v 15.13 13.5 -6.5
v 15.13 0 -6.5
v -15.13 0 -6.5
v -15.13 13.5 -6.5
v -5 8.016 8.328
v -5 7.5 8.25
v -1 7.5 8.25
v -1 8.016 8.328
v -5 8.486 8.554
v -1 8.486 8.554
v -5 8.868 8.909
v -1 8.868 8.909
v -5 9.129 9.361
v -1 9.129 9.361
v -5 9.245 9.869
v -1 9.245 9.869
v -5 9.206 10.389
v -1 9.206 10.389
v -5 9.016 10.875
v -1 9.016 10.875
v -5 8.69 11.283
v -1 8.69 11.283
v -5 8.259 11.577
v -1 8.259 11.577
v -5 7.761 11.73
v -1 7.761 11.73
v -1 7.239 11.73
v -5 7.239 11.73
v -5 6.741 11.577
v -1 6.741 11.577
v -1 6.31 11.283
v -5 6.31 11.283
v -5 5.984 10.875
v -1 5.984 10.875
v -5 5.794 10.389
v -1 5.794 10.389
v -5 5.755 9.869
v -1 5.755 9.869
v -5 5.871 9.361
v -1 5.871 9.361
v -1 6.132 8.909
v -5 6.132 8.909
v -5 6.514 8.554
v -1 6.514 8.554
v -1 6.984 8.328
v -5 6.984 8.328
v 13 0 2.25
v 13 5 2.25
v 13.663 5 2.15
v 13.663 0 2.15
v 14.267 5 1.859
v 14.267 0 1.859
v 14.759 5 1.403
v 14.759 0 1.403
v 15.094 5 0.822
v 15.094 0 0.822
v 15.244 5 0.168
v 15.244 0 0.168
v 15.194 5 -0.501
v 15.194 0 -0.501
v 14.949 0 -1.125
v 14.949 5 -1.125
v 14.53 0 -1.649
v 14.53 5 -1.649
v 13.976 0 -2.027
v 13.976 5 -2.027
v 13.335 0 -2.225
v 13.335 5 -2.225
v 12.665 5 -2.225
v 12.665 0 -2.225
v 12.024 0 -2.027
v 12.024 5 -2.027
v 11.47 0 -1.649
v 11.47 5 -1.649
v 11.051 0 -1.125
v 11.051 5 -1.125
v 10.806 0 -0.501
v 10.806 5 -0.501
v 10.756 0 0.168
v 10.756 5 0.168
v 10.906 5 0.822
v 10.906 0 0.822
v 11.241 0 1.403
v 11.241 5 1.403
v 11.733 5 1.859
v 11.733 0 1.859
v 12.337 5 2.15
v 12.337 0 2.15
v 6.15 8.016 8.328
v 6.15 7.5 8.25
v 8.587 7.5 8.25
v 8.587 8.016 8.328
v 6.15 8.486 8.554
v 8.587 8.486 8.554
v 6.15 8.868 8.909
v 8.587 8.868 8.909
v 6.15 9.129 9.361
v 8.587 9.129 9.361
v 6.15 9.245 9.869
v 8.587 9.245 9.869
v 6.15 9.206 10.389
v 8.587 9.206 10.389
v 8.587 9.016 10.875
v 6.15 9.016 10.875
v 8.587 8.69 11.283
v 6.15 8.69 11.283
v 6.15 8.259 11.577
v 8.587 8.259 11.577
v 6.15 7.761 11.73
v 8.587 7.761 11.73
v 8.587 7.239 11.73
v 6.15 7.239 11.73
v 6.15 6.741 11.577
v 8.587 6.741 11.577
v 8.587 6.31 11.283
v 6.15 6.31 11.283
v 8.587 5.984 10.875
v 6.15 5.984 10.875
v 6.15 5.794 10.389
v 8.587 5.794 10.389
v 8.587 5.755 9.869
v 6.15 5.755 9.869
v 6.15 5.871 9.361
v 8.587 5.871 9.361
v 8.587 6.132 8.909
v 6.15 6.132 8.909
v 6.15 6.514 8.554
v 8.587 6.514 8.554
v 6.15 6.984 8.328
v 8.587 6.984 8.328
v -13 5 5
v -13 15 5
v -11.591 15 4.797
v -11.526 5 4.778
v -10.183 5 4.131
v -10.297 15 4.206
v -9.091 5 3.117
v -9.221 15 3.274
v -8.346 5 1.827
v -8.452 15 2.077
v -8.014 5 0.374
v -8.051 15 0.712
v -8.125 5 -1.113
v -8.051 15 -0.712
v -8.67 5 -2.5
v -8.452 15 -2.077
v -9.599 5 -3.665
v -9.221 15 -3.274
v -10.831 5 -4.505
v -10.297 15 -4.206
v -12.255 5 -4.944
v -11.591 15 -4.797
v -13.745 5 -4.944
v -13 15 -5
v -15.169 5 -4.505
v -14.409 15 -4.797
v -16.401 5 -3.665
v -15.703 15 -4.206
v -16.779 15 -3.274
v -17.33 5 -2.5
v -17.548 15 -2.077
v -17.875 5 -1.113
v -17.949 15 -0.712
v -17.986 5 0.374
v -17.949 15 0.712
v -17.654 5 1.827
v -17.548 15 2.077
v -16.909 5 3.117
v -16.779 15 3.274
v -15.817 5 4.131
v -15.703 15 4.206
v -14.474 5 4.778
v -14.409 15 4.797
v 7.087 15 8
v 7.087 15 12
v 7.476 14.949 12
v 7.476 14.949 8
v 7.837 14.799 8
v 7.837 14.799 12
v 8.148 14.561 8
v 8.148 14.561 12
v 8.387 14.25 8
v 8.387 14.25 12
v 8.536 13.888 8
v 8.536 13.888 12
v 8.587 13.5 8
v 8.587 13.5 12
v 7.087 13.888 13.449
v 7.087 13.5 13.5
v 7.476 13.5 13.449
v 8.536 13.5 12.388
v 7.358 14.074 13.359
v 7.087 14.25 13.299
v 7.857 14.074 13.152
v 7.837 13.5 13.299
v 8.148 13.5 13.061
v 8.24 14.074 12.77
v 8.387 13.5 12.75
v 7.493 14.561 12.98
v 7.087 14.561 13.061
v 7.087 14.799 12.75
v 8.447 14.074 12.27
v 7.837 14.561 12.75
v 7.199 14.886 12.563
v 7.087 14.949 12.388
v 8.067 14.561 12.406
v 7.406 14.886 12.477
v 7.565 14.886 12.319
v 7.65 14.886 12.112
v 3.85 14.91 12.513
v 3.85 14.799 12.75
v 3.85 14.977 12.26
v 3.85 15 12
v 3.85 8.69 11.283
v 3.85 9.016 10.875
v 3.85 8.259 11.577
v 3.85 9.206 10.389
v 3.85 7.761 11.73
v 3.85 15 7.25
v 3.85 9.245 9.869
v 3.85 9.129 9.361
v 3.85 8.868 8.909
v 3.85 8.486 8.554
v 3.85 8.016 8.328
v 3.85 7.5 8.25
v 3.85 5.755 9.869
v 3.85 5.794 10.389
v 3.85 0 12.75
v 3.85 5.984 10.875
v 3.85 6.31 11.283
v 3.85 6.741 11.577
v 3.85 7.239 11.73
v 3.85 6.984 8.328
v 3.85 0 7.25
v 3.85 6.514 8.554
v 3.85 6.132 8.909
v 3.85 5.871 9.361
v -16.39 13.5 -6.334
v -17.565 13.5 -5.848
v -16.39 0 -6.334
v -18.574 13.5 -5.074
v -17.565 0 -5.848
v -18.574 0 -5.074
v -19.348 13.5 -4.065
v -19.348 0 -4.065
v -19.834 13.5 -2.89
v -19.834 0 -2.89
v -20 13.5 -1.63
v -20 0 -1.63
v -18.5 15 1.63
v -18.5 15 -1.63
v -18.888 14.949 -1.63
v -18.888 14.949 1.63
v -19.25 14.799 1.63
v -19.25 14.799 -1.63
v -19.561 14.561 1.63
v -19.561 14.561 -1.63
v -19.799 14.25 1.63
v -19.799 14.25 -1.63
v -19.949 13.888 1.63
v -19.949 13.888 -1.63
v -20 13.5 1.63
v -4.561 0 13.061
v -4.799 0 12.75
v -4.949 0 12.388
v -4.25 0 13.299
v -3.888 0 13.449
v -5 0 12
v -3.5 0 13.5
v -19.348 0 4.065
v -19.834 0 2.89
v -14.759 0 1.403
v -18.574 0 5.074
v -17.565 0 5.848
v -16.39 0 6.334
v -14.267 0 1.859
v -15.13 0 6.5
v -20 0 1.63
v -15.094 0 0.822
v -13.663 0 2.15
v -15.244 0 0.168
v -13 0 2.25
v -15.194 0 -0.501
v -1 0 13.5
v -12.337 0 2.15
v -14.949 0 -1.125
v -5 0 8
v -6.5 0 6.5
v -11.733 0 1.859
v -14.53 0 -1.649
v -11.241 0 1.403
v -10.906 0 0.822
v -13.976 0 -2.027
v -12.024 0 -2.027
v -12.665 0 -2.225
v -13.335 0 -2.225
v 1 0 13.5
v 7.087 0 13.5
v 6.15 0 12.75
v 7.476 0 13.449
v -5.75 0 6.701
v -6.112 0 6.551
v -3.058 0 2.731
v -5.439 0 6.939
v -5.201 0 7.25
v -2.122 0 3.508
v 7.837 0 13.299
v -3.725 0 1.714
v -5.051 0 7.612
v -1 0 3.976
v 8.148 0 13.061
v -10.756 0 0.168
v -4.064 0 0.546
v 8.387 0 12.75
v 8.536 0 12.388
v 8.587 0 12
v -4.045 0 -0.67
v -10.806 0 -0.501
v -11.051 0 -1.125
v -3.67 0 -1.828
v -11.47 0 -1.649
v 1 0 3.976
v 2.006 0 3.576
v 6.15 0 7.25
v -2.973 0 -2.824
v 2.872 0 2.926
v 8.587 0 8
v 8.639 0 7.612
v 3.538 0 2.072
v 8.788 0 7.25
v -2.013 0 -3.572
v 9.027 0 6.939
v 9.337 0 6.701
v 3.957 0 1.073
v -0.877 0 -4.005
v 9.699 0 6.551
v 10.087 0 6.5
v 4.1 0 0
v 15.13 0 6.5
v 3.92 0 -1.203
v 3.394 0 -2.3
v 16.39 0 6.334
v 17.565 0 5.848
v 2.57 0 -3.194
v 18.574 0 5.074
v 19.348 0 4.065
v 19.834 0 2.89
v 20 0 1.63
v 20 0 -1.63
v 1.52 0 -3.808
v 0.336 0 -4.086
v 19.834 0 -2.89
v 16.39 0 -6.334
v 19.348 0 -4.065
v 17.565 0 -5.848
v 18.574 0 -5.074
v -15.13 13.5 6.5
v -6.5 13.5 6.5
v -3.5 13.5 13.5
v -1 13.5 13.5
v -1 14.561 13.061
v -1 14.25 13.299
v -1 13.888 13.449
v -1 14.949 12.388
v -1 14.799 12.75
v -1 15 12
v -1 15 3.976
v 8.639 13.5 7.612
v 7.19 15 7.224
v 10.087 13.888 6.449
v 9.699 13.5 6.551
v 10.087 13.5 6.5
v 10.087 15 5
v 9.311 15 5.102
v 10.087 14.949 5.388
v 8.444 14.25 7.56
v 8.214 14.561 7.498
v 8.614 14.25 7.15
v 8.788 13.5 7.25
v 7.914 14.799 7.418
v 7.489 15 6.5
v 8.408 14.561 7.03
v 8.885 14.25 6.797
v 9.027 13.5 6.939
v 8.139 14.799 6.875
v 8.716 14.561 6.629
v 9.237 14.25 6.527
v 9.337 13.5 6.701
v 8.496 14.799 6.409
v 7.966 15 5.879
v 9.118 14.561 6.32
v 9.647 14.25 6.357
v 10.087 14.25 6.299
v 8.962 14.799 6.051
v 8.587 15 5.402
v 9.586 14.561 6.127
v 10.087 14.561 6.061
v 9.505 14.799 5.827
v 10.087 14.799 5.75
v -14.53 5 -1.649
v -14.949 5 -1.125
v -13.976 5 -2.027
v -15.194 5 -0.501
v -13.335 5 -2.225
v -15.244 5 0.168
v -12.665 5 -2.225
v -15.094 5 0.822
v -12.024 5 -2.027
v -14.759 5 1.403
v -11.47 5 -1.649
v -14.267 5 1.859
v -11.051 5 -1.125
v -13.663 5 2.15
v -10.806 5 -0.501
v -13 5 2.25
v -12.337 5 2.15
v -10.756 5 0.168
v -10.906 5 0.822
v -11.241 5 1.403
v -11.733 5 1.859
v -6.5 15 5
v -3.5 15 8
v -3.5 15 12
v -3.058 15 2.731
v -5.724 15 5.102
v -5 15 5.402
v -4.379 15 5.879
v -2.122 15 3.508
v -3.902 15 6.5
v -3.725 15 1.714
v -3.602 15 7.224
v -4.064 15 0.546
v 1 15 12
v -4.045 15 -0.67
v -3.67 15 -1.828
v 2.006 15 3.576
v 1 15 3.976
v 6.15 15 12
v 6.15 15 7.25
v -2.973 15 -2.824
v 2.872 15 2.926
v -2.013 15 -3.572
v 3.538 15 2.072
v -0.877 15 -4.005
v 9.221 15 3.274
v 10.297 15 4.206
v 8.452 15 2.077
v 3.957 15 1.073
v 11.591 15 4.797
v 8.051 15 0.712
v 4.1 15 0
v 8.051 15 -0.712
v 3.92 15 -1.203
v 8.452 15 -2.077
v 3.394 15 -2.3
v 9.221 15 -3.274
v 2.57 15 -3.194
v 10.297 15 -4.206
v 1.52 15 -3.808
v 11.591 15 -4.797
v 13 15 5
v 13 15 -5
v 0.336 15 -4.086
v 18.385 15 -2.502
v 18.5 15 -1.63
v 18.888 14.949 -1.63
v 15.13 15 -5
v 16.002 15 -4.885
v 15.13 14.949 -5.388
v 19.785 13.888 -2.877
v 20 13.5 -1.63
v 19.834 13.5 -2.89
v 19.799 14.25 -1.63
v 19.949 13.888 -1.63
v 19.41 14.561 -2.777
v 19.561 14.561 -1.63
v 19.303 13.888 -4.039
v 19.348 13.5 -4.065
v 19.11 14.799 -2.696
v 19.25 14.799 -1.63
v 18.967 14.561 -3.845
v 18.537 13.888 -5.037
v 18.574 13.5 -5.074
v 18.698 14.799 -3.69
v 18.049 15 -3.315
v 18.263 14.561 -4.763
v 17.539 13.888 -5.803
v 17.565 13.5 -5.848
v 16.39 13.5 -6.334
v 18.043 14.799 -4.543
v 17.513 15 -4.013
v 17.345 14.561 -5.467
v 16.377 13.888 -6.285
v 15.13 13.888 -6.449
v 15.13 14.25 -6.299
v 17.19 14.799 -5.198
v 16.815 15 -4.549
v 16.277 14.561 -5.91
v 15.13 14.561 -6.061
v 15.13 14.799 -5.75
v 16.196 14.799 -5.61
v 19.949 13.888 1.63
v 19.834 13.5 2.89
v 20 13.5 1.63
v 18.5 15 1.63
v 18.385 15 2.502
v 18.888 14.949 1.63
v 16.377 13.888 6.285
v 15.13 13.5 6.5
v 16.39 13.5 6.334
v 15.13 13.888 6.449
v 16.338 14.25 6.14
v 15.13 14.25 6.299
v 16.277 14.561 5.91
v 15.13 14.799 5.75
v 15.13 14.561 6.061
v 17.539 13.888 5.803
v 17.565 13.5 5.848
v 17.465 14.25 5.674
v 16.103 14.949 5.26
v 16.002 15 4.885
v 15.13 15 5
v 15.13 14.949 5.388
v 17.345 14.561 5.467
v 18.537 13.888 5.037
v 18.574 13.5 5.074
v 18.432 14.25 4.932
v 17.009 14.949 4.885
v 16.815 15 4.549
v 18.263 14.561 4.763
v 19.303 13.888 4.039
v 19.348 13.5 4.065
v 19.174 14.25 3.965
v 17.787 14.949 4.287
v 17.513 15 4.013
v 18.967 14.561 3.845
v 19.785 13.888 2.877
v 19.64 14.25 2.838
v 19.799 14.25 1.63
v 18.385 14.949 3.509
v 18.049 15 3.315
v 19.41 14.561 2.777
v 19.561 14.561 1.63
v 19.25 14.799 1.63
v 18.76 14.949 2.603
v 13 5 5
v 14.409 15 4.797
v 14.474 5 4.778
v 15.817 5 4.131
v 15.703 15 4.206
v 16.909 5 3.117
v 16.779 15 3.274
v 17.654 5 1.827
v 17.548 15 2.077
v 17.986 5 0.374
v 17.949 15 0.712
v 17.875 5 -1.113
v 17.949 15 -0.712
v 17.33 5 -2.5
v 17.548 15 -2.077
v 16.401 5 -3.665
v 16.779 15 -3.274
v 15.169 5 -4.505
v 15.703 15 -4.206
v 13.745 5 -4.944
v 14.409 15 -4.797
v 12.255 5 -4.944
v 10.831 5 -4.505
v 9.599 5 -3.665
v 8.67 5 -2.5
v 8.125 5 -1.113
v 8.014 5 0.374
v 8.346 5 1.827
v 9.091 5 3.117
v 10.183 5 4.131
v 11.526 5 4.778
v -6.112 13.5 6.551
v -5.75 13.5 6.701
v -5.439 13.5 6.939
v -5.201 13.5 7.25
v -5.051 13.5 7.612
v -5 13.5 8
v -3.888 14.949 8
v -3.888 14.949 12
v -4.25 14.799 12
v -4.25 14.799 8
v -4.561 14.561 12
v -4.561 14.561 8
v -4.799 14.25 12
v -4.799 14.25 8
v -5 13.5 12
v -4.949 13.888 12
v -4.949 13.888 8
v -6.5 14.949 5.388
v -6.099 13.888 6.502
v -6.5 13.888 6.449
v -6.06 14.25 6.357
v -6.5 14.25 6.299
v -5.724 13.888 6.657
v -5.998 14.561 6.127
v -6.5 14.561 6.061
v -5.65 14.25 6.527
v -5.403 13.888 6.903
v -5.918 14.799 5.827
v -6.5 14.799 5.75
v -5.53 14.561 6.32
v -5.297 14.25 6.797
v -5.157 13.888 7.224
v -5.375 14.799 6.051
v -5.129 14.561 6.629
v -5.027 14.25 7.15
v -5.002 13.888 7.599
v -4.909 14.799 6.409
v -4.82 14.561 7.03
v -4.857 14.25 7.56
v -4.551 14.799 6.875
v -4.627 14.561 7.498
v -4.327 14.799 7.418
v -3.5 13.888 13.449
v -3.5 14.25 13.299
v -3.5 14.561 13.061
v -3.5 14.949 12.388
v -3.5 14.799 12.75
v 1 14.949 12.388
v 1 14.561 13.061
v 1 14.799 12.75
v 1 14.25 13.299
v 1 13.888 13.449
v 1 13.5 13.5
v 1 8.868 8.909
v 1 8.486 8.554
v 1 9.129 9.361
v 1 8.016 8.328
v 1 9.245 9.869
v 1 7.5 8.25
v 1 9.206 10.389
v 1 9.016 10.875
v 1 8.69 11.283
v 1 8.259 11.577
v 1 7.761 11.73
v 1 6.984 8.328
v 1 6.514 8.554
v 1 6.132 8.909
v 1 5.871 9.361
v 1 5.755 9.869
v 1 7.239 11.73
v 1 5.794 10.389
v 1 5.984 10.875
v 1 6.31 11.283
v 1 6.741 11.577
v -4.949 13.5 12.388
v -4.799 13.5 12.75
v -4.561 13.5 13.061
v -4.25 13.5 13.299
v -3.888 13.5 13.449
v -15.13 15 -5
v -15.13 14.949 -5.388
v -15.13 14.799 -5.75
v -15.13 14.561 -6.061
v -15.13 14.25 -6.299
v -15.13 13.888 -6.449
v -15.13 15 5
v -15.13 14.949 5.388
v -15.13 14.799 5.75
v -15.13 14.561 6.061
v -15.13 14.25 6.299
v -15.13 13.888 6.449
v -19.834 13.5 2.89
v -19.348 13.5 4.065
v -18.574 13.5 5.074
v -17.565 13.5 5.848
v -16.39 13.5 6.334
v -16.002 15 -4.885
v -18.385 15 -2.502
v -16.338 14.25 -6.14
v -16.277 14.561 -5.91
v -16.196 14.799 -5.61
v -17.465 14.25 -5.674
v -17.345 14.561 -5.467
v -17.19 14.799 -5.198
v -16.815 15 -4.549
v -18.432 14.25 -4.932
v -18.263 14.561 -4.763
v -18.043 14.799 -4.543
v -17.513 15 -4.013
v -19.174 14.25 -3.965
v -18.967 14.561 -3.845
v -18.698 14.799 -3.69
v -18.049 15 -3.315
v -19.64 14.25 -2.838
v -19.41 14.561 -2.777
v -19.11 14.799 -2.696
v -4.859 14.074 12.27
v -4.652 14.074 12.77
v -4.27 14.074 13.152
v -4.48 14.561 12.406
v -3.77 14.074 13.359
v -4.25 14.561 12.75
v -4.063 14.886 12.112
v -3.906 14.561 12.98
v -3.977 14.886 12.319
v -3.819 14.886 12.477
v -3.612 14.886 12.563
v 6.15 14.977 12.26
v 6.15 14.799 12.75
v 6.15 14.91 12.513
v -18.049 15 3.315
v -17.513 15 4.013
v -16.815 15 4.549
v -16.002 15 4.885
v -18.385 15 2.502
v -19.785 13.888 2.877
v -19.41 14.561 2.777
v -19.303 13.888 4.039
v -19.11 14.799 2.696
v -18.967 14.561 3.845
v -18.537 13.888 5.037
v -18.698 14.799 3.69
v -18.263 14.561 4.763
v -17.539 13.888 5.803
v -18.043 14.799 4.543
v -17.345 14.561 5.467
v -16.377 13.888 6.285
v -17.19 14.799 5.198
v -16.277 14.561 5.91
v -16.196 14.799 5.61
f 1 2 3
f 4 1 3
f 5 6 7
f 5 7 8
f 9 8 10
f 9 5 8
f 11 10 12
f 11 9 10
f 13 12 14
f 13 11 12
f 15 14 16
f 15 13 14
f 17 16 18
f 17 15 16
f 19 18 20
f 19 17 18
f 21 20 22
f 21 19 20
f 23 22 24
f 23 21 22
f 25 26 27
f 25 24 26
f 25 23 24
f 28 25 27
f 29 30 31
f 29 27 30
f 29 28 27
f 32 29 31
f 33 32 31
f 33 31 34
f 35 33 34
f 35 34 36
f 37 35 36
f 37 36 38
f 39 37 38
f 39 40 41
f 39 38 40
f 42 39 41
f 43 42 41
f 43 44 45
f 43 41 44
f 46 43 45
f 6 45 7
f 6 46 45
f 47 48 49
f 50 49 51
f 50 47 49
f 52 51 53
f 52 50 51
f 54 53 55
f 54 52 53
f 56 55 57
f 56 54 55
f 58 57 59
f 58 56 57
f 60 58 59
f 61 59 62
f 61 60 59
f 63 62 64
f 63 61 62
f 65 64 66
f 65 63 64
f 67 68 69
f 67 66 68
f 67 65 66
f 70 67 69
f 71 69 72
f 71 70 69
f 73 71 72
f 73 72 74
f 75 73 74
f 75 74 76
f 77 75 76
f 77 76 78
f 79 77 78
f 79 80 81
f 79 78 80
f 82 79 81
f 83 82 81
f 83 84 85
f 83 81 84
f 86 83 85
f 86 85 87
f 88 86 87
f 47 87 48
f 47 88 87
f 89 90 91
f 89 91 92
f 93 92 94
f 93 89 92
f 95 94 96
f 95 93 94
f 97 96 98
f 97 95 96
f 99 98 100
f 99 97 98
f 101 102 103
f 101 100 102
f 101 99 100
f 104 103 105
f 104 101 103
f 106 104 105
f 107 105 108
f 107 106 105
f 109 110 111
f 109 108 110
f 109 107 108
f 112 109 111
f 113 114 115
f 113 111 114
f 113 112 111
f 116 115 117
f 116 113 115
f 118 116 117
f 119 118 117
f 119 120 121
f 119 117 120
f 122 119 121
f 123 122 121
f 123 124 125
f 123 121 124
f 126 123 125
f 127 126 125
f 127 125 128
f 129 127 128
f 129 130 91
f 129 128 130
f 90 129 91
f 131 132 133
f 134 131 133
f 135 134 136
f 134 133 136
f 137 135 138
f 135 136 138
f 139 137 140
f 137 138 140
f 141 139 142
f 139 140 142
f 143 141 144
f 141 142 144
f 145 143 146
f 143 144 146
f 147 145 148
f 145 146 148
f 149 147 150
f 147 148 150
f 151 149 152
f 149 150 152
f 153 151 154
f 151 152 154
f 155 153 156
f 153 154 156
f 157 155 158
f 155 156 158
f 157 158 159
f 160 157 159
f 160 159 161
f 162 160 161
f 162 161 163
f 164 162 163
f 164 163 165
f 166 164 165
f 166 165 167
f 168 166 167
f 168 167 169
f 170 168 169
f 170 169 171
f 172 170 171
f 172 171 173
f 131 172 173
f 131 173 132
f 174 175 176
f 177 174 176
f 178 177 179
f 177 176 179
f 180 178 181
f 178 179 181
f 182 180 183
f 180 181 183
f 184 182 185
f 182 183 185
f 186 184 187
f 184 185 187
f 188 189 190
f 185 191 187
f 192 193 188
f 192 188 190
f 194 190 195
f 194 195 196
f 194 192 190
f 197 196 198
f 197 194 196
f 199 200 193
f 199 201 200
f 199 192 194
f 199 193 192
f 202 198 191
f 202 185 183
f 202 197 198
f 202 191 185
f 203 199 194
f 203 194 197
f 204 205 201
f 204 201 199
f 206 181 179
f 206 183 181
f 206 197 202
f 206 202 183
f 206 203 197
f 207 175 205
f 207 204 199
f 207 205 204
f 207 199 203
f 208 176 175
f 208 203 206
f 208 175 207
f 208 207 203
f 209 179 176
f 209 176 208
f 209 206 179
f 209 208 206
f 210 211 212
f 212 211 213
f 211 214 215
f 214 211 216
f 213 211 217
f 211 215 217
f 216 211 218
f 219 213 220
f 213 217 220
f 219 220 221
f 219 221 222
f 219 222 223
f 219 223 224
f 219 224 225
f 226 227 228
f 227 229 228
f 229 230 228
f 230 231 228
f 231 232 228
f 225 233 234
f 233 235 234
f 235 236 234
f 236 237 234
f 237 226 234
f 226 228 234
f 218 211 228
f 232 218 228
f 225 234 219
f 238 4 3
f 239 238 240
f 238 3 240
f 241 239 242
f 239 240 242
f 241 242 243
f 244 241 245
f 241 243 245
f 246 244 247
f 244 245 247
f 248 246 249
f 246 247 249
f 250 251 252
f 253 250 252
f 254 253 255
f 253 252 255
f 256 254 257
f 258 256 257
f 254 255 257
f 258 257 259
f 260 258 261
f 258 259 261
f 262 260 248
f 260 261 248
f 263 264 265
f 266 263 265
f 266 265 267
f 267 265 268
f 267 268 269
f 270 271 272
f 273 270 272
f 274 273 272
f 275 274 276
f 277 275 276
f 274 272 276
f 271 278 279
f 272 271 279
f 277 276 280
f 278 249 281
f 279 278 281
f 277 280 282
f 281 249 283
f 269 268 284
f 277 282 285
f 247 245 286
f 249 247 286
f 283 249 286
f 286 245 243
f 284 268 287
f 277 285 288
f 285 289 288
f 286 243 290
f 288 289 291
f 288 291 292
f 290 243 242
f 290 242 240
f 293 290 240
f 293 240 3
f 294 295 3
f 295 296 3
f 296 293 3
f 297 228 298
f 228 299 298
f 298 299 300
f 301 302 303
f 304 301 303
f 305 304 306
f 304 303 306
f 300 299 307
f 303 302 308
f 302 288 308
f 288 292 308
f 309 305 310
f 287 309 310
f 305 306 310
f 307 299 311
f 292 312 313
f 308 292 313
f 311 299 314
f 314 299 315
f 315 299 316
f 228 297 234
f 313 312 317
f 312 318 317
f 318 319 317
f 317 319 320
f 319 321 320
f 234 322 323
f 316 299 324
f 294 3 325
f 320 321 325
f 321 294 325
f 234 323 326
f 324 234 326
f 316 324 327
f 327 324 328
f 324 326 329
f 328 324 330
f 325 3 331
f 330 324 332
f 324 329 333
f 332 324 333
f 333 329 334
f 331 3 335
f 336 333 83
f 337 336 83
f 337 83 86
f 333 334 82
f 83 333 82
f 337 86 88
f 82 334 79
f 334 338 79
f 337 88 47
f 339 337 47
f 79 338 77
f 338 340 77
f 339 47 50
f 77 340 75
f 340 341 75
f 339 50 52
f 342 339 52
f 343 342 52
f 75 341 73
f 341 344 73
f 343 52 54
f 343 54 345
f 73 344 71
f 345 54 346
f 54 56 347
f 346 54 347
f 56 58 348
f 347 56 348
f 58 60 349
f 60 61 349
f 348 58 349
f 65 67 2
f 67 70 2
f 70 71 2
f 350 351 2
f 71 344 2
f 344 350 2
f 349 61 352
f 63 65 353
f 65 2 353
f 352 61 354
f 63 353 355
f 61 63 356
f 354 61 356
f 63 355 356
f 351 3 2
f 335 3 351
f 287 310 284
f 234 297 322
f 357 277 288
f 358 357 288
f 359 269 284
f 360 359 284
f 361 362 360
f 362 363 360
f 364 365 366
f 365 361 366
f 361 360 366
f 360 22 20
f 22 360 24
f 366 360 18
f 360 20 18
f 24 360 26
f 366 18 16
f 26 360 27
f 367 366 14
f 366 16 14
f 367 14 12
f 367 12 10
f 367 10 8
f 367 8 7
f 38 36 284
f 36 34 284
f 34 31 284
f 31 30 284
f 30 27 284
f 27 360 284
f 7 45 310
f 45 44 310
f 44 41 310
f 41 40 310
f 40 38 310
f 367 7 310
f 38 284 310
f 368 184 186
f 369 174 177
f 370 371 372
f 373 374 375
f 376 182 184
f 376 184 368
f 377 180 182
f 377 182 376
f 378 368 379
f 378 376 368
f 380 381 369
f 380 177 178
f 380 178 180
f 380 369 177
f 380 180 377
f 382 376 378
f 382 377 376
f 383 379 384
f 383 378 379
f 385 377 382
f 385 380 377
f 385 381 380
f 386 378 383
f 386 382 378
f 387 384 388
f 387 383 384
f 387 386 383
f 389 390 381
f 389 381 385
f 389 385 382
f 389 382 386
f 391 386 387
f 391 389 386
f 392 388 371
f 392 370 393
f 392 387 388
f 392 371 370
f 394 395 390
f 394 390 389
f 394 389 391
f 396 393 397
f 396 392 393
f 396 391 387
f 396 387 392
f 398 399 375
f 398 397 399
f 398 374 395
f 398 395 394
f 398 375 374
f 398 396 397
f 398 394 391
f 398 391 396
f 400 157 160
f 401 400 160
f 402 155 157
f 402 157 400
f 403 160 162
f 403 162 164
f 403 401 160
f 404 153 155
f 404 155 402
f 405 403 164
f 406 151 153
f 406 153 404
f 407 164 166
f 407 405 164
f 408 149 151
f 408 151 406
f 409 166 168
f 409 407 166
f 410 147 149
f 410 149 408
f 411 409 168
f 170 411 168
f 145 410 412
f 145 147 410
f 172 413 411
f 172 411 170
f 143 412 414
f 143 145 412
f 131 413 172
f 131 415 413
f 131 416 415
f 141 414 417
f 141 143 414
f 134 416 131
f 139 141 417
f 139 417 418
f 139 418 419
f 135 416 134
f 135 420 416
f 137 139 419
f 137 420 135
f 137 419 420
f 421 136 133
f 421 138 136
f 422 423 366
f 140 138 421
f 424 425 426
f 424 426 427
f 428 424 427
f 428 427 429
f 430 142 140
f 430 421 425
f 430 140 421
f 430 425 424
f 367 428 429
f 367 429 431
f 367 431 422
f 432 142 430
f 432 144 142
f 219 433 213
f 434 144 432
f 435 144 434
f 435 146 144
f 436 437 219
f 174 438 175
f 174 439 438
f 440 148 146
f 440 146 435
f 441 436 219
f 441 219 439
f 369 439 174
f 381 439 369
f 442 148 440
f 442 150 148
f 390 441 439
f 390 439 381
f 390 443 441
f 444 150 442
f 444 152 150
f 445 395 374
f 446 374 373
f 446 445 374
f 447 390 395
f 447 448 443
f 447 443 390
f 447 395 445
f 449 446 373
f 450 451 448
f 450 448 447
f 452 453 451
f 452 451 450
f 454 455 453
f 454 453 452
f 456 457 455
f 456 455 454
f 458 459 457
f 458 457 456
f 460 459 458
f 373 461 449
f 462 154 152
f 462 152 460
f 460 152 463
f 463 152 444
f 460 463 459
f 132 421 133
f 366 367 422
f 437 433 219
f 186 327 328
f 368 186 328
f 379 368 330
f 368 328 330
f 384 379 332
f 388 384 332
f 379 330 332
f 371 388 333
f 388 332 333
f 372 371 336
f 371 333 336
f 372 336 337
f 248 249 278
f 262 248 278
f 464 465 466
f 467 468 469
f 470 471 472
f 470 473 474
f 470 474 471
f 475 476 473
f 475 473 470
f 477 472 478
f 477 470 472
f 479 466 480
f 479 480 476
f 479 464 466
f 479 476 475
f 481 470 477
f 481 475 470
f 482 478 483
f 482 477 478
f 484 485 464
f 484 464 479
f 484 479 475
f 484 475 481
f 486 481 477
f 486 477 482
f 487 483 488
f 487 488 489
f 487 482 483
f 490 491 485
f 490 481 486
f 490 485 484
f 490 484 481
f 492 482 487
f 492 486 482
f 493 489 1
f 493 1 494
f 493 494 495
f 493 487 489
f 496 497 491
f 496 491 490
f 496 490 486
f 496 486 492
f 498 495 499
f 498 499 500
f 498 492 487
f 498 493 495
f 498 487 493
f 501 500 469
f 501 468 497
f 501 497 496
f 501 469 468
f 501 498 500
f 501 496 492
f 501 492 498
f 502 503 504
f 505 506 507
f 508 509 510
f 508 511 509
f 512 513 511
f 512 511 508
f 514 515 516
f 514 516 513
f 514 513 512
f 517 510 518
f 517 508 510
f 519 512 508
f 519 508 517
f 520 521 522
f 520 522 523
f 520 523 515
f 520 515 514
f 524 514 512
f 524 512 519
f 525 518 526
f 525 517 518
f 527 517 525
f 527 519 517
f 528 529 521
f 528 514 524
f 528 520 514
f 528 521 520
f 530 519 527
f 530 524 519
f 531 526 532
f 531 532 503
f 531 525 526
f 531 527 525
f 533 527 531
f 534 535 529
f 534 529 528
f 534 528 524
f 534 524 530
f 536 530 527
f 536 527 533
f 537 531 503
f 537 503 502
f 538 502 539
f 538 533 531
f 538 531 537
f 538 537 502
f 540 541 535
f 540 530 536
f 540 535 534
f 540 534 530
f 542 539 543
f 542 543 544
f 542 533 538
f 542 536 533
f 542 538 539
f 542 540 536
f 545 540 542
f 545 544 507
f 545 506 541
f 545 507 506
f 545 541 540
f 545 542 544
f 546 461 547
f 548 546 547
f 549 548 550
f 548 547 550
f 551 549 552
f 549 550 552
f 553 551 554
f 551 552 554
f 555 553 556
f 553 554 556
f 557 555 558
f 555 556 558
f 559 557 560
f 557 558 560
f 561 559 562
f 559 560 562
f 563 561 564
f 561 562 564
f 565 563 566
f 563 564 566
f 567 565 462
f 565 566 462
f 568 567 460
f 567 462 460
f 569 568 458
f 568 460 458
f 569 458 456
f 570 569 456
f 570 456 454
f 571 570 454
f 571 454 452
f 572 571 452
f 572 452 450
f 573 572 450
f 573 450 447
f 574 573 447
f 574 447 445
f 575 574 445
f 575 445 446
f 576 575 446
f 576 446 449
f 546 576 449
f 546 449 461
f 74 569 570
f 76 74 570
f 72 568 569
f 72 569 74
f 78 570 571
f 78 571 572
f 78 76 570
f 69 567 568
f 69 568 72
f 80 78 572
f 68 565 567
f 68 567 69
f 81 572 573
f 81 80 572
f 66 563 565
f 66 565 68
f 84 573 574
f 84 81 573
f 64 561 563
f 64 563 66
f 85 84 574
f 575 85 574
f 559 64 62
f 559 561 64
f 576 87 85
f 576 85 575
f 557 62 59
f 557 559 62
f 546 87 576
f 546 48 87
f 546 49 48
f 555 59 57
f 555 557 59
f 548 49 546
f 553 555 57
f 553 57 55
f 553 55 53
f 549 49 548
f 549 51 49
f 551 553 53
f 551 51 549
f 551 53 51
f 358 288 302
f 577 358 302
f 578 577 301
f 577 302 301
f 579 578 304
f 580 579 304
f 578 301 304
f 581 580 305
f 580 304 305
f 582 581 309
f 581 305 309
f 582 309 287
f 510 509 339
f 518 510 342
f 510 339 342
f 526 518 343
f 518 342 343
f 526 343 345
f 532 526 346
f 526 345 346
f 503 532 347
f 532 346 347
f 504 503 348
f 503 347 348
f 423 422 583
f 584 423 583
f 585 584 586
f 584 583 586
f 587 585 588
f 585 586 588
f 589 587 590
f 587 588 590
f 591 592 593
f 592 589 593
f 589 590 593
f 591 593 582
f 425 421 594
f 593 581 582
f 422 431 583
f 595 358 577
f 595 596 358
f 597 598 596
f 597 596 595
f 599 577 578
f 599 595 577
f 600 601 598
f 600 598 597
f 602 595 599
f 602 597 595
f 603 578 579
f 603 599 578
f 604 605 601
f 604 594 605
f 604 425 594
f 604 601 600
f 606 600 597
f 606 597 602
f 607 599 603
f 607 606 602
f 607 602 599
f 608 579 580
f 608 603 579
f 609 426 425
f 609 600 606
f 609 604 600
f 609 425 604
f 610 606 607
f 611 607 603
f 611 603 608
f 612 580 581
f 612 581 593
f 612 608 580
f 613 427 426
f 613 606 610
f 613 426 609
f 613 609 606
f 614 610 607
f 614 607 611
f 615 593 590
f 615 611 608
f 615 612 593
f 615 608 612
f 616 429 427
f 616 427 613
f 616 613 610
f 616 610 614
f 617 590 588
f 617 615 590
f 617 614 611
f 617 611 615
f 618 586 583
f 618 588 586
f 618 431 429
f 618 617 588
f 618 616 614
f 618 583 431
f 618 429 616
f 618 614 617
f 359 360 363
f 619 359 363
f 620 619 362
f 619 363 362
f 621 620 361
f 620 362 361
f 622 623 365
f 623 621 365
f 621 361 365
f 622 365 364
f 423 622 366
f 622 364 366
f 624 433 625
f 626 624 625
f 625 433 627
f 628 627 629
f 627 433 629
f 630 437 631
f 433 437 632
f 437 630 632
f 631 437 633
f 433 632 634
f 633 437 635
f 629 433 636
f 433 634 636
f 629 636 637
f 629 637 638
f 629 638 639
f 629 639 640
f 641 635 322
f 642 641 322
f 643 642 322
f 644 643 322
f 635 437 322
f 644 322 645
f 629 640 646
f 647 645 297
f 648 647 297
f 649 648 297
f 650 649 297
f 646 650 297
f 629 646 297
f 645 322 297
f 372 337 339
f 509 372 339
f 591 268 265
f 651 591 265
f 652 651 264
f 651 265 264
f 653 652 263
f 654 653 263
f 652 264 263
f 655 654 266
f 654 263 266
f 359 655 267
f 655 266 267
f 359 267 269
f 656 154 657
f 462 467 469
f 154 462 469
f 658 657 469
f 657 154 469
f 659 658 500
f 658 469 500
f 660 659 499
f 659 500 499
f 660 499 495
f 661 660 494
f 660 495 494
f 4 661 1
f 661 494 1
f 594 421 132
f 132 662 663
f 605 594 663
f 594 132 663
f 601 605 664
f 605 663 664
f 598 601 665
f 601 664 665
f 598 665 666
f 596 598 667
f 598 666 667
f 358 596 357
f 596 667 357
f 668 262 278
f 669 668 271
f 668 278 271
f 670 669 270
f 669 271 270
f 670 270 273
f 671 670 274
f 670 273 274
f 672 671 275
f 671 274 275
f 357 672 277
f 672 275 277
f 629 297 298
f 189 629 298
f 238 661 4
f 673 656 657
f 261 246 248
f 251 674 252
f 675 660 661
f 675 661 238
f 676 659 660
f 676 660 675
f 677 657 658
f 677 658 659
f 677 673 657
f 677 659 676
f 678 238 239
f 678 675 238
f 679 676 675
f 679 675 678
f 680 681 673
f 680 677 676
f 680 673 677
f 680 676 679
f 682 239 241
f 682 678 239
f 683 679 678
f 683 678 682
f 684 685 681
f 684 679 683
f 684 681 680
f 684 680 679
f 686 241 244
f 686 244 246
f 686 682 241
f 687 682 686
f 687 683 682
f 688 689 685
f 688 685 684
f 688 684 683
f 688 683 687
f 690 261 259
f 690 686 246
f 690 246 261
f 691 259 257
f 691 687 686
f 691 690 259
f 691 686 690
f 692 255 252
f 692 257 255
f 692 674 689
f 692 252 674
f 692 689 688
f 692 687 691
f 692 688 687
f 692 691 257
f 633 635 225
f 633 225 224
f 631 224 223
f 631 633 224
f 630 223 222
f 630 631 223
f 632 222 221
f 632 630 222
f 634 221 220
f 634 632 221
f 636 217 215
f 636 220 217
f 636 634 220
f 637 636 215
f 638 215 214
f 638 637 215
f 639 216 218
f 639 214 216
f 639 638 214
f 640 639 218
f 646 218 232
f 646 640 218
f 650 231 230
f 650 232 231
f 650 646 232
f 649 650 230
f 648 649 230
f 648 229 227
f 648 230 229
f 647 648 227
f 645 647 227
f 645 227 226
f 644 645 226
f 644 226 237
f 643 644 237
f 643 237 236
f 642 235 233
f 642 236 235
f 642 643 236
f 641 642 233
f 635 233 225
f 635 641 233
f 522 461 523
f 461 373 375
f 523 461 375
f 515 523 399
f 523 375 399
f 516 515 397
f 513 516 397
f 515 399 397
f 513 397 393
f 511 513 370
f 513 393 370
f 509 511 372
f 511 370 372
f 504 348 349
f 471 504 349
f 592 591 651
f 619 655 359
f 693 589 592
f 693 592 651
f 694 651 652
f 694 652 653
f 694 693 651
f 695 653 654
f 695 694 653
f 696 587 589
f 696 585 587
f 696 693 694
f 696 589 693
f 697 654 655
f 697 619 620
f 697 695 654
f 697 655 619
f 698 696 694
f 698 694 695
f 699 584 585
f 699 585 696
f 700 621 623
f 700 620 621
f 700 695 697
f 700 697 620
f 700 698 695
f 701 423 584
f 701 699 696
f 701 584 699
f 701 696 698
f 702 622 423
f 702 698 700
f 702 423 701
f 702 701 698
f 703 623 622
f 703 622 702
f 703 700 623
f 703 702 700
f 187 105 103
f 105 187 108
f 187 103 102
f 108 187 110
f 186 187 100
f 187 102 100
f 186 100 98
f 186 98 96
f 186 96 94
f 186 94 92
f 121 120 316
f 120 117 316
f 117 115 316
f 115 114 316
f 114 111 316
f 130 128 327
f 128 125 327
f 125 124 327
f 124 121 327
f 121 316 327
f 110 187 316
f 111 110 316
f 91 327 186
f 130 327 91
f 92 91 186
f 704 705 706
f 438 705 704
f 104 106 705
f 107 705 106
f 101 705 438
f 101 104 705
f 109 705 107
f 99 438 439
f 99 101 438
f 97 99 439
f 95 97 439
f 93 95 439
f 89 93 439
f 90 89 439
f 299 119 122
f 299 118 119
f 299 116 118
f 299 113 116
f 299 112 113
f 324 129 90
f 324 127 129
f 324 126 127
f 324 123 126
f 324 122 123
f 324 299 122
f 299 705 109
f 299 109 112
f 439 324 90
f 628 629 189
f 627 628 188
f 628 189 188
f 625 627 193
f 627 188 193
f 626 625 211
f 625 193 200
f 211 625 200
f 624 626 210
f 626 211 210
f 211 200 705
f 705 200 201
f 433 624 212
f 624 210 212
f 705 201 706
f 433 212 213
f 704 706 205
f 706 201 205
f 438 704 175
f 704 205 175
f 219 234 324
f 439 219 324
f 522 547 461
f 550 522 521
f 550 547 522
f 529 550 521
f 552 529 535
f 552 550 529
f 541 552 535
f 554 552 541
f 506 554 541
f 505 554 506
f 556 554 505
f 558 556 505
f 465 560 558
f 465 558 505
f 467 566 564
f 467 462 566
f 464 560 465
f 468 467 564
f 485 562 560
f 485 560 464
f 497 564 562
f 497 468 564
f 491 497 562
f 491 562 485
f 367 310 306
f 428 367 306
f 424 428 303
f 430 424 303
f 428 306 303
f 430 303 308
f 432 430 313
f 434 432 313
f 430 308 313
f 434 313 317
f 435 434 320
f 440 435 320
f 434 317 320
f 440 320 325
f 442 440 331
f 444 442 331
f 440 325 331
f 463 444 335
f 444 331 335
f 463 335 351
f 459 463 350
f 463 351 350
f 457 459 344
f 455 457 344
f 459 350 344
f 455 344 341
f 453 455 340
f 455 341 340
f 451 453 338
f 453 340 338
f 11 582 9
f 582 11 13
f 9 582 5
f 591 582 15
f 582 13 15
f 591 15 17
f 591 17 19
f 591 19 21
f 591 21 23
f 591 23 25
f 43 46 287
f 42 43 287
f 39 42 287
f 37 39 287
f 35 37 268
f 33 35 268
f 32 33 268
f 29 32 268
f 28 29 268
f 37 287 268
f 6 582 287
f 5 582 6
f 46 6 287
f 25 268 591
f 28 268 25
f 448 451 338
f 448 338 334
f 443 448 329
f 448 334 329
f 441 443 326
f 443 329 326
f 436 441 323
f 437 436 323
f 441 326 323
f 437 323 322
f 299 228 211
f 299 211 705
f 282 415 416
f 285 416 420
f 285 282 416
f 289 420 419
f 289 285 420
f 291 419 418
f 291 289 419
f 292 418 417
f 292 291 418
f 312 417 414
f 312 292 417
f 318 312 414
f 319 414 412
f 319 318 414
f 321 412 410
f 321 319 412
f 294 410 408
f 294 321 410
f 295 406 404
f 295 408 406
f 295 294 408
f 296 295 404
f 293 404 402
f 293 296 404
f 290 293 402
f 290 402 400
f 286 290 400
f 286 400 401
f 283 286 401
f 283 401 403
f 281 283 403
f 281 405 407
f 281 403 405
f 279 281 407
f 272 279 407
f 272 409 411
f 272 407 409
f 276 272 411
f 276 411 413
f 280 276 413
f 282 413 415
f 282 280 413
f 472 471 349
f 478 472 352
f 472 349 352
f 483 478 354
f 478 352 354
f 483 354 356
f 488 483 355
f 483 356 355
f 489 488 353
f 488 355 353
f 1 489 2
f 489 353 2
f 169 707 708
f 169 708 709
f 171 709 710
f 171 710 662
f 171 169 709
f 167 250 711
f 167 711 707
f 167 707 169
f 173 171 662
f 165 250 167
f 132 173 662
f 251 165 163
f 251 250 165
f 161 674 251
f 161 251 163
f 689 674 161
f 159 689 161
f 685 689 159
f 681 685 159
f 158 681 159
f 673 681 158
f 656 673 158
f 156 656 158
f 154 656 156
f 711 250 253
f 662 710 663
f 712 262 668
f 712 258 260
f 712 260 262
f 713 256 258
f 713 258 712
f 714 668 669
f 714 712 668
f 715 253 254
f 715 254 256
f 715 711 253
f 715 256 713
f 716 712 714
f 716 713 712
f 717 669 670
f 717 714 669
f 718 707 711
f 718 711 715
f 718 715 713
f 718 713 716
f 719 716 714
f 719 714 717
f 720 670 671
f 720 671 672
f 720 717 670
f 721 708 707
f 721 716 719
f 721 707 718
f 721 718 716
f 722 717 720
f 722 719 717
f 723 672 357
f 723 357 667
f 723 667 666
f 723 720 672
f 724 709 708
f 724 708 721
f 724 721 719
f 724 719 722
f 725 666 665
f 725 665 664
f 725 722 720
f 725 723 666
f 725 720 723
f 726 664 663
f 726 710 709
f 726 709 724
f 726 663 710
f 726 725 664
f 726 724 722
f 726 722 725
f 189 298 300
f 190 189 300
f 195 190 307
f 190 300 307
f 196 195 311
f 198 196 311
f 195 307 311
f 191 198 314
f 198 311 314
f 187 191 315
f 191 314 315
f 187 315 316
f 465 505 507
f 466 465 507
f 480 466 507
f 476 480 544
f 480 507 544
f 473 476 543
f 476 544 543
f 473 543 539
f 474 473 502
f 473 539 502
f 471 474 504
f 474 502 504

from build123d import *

# Parameters (mm, degrees)
SKETCH1_W               = 2.3
SKETCH1_H               = 5.5
SKETCH1_R               = 2.25
BOSS_EXTRUDE1_DEPTH     = 15
CUT_EXTRUDE1_DEPTH      = 33.128647653
CUT_EXTRUDE1_DEPTH_BACK = 33.128647653
SKETCH2_R               = 1.75
FILLET2_R               = 1.5
SKETCH4_R               = 5
CUT_EXTRUDE2_DEPTH      = 10


with BuildPart() as part:
    # Sketch1 → Boss-Extrude1 (new body)
    with BuildSketch(Plane(origin=(0, 0, 0), x_dir=(1, 0, 0), z_dir=(0, 1, 0))):
        with BuildLine():
            Line((15.13, 6.5), (-15.13, 6.5))
            ThreePointArc((-15.13, 6.5), (-18.573610024, 5.073610024), (-20, 1.63))
            Line((-20, 1.63), (-20, -1.63))
            ThreePointArc((-20, -1.63), (-18.573610024, -5.073610024), (-15.13, -6.5))
            Line((-15.13, -6.5), (-6.5, -6.5))
            ThreePointArc((-6.5, -6.5), (-5.439339828, -6.939339828), (-5, -8))
            Line((-5, -8), (-5, -12))
            ThreePointArc((-5, -12), (-4.560660172, -13.060660172), (-3.5, -13.5))
            Line((-3.5, -13.5), (-1, -13.5))
            Line((-1, -13.5), (-1, -3.97617907))
            ThreePointArc((-1, -3.97617907), (-2.520912533, 3.233419243), (4.1, 0))
            ThreePointArc((4.1, 0), (3.233419243, -2.520912533), (1, -3.97617907))
            Line((1, -3.97617907), (1, -13.5))
            Line((1, -13.5), (5.587465673, -13.5))
            Line((5.587465673, -13.5), (7.087465673, -13.5))
            ThreePointArc((7.087465673, -13.5), (8.148125845, -13.060660172), (8.587465673, -12))
            Line((8.587465673, -12), (8.587465673, -8))
            ThreePointArc((8.587465673, -8), (9.026805501, -6.939339828), (10.087465673, -6.5))
            Line((10.087465673, -6.5), (15.13, -6.5))
            ThreePointArc((15.13, -6.5), (18.573610024, -5.073610024), (20, -1.63))
            Line((20, -1.63), (20, 1.63))
            ThreePointArc((20, 1.63), (18.573610024, 5.073610024), (15.13, 6.5))
        make_face()
        with Locations((5, -10)):
            Rectangle(SKETCH1_W, SKETCH1_H, mode=Mode.SUBTRACT)
        with Locations(Location((-13, 0, 0), (0, 0, 270))):
            Circle(SKETCH1_R, mode=Mode.SUBTRACT)
        with Locations(Location((13, 0, 0), (0, 0, 270))):
            Circle(SKETCH1_R, mode=Mode.SUBTRACT)
    extrude(amount=BOSS_EXTRUDE1_DEPTH)

    # Sketch2 → Cut-Extrude1 (cut, two sides: drawn at the far end of the back side and taken through both)
    with BuildSketch(Plane(origin=(5, 0, 0), x_dir=(0, 0, -1), z_dir=(1, 0, 0)).offset(-CUT_EXTRUDE1_DEPTH_BACK)):
        with Locations((-10, 7.5)):
            Circle(SKETCH2_R)
    extrude(amount=CUT_EXTRUDE1_DEPTH + CUT_EXTRUDE1_DEPTH_BACK, mode=Mode.SUBTRACT)

    # Fillet2
    # the kernel refuses this fillet: 1.5 mm, written as the material it takes off along each edge
    with BuildSketch(Plane(origin=(7.087465673, 15, 13.5), x_dir=(0, 0, -1), z_dir=(-1, 0, 0))) as fillet2_piece_1:
        with BuildLine():
            CenterArc((FILLET2_R, FILLET2_R), FILLET2_R, 180, 90)
            Line((0, FILLET2_R), (0, 0))
            Line((0, 0), (FILLET2_R, 0))
        make_face()
    extrude(amount=9.837465673, mode=Mode.SUBTRACT)
    with BuildSketch(Plane(origin=(10.087465673, 15, 6.5), x_dir=(0, 0, -1), z_dir=(1, 0, 0))) as fillet2_piece_2:
        with BuildLine():
            CenterArc((FILLET2_R, -FILLET2_R), FILLET2_R, 90, 90)
            Line((0, -FILLET2_R), (0, 0))
            Line((0, 0), (FILLET2_R, 0))
        make_face()
    extrude(amount=5.042534327, mode=Mode.SUBTRACT)
    with BuildSketch(Plane(origin=(15.13, 15, 1.63), x_dir=(0, 0, 1), z_dir=(-1, 0, 0))) as fillet2_piece_3:
        with BuildLine():
            CenterArc((4.87 - FILLET2_R, -FILLET2_R), FILLET2_R, 0, 90)
            Line((4.87, -FILLET2_R), (4.87, 0))
            Line((4.87, 0), (4.87 - FILLET2_R, 0))
        make_face()
    revolve(axis=Axis((15.13, 15, 1.63), (0, 1, 0)), revolution_arc=90, mode=Mode.SUBTRACT)
    with BuildSketch(Plane(origin=(20, 15, 1.63), x_dir=(-1, 0, 0), z_dir=(0, 0, -1)), Plane(origin=(-20, 15, -1.63), x_dir=(1, 0, 0), z_dir=(0, 0, 1))) as fillet2_piece_4:
        with BuildLine():
            CenterArc((FILLET2_R, -FILLET2_R), FILLET2_R, 90, 90)
            Line((0, -FILLET2_R), (0, 0))
            Line((0, 0), (FILLET2_R, 0))
        make_face()
    extrude(amount=3.26, mode=Mode.SUBTRACT)
    with BuildSketch(Plane(origin=(15.13, 15, -1.63), x_dir=(1, 0, 0), z_dir=(0, 0, 1))) as fillet2_piece_5:
        with BuildLine():
            CenterArc((4.87 - FILLET2_R, -FILLET2_R), FILLET2_R, 0, 90)
            Line((4.87, -FILLET2_R), (4.87, 0))
            Line((4.87, 0), (4.87 - FILLET2_R, 0))
        make_face()
    revolve(axis=Axis((15.13, 15, -1.63), (0, 1, 0)), revolution_arc=90, mode=Mode.SUBTRACT)
    with BuildSketch(Plane(origin=(15.13, 15, -6.5), x_dir=(0, 0, 1), z_dir=(-1, 0, 0))) as fillet2_piece_6:
        with BuildLine():
            CenterArc((FILLET2_R, -FILLET2_R), FILLET2_R, 90, 90)
            Line((0, -FILLET2_R), (0, 0))
            Line((0, 0), (FILLET2_R, 0))
        make_face()
    extrude(amount=30.26, mode=Mode.SUBTRACT)
    with BuildSketch(Plane(origin=(-15.13, 15, -1.63), x_dir=(0, 0, -1), z_dir=(1, 0, 0))) as fillet2_piece_7:
        with BuildLine():
            CenterArc((4.87 - FILLET2_R, -FILLET2_R), FILLET2_R, 0, 90)
            Line((4.87, -FILLET2_R), (4.87, 0))
            Line((4.87, 0), (4.87 - FILLET2_R, 0))
        make_face()
    revolve(axis=Axis((-15.13, 15, -1.63), (0, 1, 0)), revolution_arc=90, mode=Mode.SUBTRACT)
    with BuildSketch(Plane(origin=(-3.5, 15, 13.5), x_dir=(0, 0, -1), z_dir=(1, 0, 0))) as fillet2_piece_8:
        with BuildLine():
            CenterArc((FILLET2_R, -FILLET2_R), FILLET2_R, 90, 90)
            Line((0, -FILLET2_R), (0, 0))
            Line((0, 0), (FILLET2_R, 0))
        make_face()
    extrude(amount=6.25, mode=Mode.SUBTRACT)
    with BuildSketch(Plane(origin=(-3.5, 15, 12), x_dir=(-1, 0, 0), z_dir=(0, 0, -1))) as fillet2_piece_9:
        with BuildLine():
            CenterArc((1.5 - FILLET2_R, -FILLET2_R), FILLET2_R, 0, 90)
            Line((1.5, -FILLET2_R), (1.5, 0))
            Line((1.5, 0), (1.5 - FILLET2_R, 0))
        make_face()
    revolve(axis=Axis((-3.5, 15, 12), (0, 1, 0)), revolution_arc=90, mode=Mode.SUBTRACT)
    with BuildSketch(Plane(origin=(-5, 15, 8), x_dir=(1, 0, 0), z_dir=(0, 0, 1)), Plane(origin=(8.587465673, 15, 12), x_dir=(-1, 0, 0), z_dir=(0, 0, -1))) as fillet2_piece_10:
        with BuildLine():
            CenterArc((FILLET2_R, -FILLET2_R), FILLET2_R, 90, 90)
            Line((0, -FILLET2_R), (0, 0))
            Line((0, 0), (FILLET2_R, 0))
        make_face()
    extrude(amount=4, mode=Mode.SUBTRACT)
    with BuildSketch(Plane(origin=(-6.5, 15, 8), x_dir=(0, 0, -1), z_dir=(-1, 0, 0))) as fillet2_piece_11:
        with BuildLine():
            CenterArc((1.5 + FILLET2_R, FILLET2_R), FILLET2_R, 180, 90)
            Line((1.5, FILLET2_R), (1.5, 0))
            Line((1.5, 0), (1.5 + FILLET2_R, 0))
        make_face()
    revolve(axis=Axis((-6.5, 15, 8), (0, -1, 0)), revolution_arc=90, mode=Mode.SUBTRACT)
    with BuildSketch(Plane(origin=(-15.13, 15, 1.63), x_dir=(-1, 0, 0), z_dir=(0, 0, -1))) as fillet2_piece_12:
        with BuildLine():
            CenterArc((4.87 - FILLET2_R, -FILLET2_R), FILLET2_R, 0, 90)
            Line((4.87, -FILLET2_R), (4.87, 0))
            Line((4.87, 0), (4.87 - FILLET2_R, 0))
        make_face()
    revolve(axis=Axis((-15.13, 15, 1.63), (0, 1, 0)), revolution_arc=90, mode=Mode.SUBTRACT)
    with BuildSketch(Plane(origin=(-15.13, 15, 6.5), x_dir=(0, 0, -1), z_dir=(1, 0, 0))) as fillet2_piece_13:
        with BuildLine():
            CenterArc((FILLET2_R, -FILLET2_R), FILLET2_R, 90, 90)
            Line((0, -FILLET2_R), (0, 0))
            Line((0, 0), (FILLET2_R, 0))
        make_face()
    extrude(amount=8.63, mode=Mode.SUBTRACT)
    with BuildSketch(Plane(origin=(7.087465673, 15, 12), x_dir=(0, 0, 1), z_dir=(-1, 0, 0))) as fillet2_piece_14:
        with BuildLine():
            CenterArc((1.5 - FILLET2_R, -FILLET2_R), FILLET2_R, 0, 90)
            Line((1.5, -FILLET2_R), (1.5, 0))
            Line((1.5, 0), (1.5 - FILLET2_R, 0))
        make_face()
    revolve(axis=Axis((7.087465673, 15, 12), (0, 1, 0)), revolution_arc=90, mode=Mode.SUBTRACT)
    with BuildSketch(Plane(origin=(10.087465673, 15, 8), x_dir=(-1, 0, 0), z_dir=(0, 0, 1))) as fillet2_piece_15:
        with BuildLine():
            CenterArc((1.5 + FILLET2_R, FILLET2_R), FILLET2_R, 180, 90)
            Line((1.5, FILLET2_R), (1.5, 0))
            Line((1.5, 0), (1.5 + FILLET2_R, 0))
        make_face()
    revolve(axis=Axis((10.087465673, 15, 8), (0, -1, 0)), revolution_arc=90, mode=Mode.SUBTRACT)

    # Sketch4 → Cut-Extrude2 (cut)
    with BuildSketch(Plane(origin=(0, 15, 0), x_dir=(1, 0, 0), z_dir=(0, 1, 0))):
        with Locations(Location((-13, 0, 0), (0, 0, 270))):
            Circle(SKETCH4_R)
        with Locations(Location((13, 0, 0), (0, 0, 270))):
            Circle(SKETCH4_R)
    extrude(amount=-CUT_EXTRUDE2_DEPTH, mode=Mode.SUBTRACT)


solid = part.part
